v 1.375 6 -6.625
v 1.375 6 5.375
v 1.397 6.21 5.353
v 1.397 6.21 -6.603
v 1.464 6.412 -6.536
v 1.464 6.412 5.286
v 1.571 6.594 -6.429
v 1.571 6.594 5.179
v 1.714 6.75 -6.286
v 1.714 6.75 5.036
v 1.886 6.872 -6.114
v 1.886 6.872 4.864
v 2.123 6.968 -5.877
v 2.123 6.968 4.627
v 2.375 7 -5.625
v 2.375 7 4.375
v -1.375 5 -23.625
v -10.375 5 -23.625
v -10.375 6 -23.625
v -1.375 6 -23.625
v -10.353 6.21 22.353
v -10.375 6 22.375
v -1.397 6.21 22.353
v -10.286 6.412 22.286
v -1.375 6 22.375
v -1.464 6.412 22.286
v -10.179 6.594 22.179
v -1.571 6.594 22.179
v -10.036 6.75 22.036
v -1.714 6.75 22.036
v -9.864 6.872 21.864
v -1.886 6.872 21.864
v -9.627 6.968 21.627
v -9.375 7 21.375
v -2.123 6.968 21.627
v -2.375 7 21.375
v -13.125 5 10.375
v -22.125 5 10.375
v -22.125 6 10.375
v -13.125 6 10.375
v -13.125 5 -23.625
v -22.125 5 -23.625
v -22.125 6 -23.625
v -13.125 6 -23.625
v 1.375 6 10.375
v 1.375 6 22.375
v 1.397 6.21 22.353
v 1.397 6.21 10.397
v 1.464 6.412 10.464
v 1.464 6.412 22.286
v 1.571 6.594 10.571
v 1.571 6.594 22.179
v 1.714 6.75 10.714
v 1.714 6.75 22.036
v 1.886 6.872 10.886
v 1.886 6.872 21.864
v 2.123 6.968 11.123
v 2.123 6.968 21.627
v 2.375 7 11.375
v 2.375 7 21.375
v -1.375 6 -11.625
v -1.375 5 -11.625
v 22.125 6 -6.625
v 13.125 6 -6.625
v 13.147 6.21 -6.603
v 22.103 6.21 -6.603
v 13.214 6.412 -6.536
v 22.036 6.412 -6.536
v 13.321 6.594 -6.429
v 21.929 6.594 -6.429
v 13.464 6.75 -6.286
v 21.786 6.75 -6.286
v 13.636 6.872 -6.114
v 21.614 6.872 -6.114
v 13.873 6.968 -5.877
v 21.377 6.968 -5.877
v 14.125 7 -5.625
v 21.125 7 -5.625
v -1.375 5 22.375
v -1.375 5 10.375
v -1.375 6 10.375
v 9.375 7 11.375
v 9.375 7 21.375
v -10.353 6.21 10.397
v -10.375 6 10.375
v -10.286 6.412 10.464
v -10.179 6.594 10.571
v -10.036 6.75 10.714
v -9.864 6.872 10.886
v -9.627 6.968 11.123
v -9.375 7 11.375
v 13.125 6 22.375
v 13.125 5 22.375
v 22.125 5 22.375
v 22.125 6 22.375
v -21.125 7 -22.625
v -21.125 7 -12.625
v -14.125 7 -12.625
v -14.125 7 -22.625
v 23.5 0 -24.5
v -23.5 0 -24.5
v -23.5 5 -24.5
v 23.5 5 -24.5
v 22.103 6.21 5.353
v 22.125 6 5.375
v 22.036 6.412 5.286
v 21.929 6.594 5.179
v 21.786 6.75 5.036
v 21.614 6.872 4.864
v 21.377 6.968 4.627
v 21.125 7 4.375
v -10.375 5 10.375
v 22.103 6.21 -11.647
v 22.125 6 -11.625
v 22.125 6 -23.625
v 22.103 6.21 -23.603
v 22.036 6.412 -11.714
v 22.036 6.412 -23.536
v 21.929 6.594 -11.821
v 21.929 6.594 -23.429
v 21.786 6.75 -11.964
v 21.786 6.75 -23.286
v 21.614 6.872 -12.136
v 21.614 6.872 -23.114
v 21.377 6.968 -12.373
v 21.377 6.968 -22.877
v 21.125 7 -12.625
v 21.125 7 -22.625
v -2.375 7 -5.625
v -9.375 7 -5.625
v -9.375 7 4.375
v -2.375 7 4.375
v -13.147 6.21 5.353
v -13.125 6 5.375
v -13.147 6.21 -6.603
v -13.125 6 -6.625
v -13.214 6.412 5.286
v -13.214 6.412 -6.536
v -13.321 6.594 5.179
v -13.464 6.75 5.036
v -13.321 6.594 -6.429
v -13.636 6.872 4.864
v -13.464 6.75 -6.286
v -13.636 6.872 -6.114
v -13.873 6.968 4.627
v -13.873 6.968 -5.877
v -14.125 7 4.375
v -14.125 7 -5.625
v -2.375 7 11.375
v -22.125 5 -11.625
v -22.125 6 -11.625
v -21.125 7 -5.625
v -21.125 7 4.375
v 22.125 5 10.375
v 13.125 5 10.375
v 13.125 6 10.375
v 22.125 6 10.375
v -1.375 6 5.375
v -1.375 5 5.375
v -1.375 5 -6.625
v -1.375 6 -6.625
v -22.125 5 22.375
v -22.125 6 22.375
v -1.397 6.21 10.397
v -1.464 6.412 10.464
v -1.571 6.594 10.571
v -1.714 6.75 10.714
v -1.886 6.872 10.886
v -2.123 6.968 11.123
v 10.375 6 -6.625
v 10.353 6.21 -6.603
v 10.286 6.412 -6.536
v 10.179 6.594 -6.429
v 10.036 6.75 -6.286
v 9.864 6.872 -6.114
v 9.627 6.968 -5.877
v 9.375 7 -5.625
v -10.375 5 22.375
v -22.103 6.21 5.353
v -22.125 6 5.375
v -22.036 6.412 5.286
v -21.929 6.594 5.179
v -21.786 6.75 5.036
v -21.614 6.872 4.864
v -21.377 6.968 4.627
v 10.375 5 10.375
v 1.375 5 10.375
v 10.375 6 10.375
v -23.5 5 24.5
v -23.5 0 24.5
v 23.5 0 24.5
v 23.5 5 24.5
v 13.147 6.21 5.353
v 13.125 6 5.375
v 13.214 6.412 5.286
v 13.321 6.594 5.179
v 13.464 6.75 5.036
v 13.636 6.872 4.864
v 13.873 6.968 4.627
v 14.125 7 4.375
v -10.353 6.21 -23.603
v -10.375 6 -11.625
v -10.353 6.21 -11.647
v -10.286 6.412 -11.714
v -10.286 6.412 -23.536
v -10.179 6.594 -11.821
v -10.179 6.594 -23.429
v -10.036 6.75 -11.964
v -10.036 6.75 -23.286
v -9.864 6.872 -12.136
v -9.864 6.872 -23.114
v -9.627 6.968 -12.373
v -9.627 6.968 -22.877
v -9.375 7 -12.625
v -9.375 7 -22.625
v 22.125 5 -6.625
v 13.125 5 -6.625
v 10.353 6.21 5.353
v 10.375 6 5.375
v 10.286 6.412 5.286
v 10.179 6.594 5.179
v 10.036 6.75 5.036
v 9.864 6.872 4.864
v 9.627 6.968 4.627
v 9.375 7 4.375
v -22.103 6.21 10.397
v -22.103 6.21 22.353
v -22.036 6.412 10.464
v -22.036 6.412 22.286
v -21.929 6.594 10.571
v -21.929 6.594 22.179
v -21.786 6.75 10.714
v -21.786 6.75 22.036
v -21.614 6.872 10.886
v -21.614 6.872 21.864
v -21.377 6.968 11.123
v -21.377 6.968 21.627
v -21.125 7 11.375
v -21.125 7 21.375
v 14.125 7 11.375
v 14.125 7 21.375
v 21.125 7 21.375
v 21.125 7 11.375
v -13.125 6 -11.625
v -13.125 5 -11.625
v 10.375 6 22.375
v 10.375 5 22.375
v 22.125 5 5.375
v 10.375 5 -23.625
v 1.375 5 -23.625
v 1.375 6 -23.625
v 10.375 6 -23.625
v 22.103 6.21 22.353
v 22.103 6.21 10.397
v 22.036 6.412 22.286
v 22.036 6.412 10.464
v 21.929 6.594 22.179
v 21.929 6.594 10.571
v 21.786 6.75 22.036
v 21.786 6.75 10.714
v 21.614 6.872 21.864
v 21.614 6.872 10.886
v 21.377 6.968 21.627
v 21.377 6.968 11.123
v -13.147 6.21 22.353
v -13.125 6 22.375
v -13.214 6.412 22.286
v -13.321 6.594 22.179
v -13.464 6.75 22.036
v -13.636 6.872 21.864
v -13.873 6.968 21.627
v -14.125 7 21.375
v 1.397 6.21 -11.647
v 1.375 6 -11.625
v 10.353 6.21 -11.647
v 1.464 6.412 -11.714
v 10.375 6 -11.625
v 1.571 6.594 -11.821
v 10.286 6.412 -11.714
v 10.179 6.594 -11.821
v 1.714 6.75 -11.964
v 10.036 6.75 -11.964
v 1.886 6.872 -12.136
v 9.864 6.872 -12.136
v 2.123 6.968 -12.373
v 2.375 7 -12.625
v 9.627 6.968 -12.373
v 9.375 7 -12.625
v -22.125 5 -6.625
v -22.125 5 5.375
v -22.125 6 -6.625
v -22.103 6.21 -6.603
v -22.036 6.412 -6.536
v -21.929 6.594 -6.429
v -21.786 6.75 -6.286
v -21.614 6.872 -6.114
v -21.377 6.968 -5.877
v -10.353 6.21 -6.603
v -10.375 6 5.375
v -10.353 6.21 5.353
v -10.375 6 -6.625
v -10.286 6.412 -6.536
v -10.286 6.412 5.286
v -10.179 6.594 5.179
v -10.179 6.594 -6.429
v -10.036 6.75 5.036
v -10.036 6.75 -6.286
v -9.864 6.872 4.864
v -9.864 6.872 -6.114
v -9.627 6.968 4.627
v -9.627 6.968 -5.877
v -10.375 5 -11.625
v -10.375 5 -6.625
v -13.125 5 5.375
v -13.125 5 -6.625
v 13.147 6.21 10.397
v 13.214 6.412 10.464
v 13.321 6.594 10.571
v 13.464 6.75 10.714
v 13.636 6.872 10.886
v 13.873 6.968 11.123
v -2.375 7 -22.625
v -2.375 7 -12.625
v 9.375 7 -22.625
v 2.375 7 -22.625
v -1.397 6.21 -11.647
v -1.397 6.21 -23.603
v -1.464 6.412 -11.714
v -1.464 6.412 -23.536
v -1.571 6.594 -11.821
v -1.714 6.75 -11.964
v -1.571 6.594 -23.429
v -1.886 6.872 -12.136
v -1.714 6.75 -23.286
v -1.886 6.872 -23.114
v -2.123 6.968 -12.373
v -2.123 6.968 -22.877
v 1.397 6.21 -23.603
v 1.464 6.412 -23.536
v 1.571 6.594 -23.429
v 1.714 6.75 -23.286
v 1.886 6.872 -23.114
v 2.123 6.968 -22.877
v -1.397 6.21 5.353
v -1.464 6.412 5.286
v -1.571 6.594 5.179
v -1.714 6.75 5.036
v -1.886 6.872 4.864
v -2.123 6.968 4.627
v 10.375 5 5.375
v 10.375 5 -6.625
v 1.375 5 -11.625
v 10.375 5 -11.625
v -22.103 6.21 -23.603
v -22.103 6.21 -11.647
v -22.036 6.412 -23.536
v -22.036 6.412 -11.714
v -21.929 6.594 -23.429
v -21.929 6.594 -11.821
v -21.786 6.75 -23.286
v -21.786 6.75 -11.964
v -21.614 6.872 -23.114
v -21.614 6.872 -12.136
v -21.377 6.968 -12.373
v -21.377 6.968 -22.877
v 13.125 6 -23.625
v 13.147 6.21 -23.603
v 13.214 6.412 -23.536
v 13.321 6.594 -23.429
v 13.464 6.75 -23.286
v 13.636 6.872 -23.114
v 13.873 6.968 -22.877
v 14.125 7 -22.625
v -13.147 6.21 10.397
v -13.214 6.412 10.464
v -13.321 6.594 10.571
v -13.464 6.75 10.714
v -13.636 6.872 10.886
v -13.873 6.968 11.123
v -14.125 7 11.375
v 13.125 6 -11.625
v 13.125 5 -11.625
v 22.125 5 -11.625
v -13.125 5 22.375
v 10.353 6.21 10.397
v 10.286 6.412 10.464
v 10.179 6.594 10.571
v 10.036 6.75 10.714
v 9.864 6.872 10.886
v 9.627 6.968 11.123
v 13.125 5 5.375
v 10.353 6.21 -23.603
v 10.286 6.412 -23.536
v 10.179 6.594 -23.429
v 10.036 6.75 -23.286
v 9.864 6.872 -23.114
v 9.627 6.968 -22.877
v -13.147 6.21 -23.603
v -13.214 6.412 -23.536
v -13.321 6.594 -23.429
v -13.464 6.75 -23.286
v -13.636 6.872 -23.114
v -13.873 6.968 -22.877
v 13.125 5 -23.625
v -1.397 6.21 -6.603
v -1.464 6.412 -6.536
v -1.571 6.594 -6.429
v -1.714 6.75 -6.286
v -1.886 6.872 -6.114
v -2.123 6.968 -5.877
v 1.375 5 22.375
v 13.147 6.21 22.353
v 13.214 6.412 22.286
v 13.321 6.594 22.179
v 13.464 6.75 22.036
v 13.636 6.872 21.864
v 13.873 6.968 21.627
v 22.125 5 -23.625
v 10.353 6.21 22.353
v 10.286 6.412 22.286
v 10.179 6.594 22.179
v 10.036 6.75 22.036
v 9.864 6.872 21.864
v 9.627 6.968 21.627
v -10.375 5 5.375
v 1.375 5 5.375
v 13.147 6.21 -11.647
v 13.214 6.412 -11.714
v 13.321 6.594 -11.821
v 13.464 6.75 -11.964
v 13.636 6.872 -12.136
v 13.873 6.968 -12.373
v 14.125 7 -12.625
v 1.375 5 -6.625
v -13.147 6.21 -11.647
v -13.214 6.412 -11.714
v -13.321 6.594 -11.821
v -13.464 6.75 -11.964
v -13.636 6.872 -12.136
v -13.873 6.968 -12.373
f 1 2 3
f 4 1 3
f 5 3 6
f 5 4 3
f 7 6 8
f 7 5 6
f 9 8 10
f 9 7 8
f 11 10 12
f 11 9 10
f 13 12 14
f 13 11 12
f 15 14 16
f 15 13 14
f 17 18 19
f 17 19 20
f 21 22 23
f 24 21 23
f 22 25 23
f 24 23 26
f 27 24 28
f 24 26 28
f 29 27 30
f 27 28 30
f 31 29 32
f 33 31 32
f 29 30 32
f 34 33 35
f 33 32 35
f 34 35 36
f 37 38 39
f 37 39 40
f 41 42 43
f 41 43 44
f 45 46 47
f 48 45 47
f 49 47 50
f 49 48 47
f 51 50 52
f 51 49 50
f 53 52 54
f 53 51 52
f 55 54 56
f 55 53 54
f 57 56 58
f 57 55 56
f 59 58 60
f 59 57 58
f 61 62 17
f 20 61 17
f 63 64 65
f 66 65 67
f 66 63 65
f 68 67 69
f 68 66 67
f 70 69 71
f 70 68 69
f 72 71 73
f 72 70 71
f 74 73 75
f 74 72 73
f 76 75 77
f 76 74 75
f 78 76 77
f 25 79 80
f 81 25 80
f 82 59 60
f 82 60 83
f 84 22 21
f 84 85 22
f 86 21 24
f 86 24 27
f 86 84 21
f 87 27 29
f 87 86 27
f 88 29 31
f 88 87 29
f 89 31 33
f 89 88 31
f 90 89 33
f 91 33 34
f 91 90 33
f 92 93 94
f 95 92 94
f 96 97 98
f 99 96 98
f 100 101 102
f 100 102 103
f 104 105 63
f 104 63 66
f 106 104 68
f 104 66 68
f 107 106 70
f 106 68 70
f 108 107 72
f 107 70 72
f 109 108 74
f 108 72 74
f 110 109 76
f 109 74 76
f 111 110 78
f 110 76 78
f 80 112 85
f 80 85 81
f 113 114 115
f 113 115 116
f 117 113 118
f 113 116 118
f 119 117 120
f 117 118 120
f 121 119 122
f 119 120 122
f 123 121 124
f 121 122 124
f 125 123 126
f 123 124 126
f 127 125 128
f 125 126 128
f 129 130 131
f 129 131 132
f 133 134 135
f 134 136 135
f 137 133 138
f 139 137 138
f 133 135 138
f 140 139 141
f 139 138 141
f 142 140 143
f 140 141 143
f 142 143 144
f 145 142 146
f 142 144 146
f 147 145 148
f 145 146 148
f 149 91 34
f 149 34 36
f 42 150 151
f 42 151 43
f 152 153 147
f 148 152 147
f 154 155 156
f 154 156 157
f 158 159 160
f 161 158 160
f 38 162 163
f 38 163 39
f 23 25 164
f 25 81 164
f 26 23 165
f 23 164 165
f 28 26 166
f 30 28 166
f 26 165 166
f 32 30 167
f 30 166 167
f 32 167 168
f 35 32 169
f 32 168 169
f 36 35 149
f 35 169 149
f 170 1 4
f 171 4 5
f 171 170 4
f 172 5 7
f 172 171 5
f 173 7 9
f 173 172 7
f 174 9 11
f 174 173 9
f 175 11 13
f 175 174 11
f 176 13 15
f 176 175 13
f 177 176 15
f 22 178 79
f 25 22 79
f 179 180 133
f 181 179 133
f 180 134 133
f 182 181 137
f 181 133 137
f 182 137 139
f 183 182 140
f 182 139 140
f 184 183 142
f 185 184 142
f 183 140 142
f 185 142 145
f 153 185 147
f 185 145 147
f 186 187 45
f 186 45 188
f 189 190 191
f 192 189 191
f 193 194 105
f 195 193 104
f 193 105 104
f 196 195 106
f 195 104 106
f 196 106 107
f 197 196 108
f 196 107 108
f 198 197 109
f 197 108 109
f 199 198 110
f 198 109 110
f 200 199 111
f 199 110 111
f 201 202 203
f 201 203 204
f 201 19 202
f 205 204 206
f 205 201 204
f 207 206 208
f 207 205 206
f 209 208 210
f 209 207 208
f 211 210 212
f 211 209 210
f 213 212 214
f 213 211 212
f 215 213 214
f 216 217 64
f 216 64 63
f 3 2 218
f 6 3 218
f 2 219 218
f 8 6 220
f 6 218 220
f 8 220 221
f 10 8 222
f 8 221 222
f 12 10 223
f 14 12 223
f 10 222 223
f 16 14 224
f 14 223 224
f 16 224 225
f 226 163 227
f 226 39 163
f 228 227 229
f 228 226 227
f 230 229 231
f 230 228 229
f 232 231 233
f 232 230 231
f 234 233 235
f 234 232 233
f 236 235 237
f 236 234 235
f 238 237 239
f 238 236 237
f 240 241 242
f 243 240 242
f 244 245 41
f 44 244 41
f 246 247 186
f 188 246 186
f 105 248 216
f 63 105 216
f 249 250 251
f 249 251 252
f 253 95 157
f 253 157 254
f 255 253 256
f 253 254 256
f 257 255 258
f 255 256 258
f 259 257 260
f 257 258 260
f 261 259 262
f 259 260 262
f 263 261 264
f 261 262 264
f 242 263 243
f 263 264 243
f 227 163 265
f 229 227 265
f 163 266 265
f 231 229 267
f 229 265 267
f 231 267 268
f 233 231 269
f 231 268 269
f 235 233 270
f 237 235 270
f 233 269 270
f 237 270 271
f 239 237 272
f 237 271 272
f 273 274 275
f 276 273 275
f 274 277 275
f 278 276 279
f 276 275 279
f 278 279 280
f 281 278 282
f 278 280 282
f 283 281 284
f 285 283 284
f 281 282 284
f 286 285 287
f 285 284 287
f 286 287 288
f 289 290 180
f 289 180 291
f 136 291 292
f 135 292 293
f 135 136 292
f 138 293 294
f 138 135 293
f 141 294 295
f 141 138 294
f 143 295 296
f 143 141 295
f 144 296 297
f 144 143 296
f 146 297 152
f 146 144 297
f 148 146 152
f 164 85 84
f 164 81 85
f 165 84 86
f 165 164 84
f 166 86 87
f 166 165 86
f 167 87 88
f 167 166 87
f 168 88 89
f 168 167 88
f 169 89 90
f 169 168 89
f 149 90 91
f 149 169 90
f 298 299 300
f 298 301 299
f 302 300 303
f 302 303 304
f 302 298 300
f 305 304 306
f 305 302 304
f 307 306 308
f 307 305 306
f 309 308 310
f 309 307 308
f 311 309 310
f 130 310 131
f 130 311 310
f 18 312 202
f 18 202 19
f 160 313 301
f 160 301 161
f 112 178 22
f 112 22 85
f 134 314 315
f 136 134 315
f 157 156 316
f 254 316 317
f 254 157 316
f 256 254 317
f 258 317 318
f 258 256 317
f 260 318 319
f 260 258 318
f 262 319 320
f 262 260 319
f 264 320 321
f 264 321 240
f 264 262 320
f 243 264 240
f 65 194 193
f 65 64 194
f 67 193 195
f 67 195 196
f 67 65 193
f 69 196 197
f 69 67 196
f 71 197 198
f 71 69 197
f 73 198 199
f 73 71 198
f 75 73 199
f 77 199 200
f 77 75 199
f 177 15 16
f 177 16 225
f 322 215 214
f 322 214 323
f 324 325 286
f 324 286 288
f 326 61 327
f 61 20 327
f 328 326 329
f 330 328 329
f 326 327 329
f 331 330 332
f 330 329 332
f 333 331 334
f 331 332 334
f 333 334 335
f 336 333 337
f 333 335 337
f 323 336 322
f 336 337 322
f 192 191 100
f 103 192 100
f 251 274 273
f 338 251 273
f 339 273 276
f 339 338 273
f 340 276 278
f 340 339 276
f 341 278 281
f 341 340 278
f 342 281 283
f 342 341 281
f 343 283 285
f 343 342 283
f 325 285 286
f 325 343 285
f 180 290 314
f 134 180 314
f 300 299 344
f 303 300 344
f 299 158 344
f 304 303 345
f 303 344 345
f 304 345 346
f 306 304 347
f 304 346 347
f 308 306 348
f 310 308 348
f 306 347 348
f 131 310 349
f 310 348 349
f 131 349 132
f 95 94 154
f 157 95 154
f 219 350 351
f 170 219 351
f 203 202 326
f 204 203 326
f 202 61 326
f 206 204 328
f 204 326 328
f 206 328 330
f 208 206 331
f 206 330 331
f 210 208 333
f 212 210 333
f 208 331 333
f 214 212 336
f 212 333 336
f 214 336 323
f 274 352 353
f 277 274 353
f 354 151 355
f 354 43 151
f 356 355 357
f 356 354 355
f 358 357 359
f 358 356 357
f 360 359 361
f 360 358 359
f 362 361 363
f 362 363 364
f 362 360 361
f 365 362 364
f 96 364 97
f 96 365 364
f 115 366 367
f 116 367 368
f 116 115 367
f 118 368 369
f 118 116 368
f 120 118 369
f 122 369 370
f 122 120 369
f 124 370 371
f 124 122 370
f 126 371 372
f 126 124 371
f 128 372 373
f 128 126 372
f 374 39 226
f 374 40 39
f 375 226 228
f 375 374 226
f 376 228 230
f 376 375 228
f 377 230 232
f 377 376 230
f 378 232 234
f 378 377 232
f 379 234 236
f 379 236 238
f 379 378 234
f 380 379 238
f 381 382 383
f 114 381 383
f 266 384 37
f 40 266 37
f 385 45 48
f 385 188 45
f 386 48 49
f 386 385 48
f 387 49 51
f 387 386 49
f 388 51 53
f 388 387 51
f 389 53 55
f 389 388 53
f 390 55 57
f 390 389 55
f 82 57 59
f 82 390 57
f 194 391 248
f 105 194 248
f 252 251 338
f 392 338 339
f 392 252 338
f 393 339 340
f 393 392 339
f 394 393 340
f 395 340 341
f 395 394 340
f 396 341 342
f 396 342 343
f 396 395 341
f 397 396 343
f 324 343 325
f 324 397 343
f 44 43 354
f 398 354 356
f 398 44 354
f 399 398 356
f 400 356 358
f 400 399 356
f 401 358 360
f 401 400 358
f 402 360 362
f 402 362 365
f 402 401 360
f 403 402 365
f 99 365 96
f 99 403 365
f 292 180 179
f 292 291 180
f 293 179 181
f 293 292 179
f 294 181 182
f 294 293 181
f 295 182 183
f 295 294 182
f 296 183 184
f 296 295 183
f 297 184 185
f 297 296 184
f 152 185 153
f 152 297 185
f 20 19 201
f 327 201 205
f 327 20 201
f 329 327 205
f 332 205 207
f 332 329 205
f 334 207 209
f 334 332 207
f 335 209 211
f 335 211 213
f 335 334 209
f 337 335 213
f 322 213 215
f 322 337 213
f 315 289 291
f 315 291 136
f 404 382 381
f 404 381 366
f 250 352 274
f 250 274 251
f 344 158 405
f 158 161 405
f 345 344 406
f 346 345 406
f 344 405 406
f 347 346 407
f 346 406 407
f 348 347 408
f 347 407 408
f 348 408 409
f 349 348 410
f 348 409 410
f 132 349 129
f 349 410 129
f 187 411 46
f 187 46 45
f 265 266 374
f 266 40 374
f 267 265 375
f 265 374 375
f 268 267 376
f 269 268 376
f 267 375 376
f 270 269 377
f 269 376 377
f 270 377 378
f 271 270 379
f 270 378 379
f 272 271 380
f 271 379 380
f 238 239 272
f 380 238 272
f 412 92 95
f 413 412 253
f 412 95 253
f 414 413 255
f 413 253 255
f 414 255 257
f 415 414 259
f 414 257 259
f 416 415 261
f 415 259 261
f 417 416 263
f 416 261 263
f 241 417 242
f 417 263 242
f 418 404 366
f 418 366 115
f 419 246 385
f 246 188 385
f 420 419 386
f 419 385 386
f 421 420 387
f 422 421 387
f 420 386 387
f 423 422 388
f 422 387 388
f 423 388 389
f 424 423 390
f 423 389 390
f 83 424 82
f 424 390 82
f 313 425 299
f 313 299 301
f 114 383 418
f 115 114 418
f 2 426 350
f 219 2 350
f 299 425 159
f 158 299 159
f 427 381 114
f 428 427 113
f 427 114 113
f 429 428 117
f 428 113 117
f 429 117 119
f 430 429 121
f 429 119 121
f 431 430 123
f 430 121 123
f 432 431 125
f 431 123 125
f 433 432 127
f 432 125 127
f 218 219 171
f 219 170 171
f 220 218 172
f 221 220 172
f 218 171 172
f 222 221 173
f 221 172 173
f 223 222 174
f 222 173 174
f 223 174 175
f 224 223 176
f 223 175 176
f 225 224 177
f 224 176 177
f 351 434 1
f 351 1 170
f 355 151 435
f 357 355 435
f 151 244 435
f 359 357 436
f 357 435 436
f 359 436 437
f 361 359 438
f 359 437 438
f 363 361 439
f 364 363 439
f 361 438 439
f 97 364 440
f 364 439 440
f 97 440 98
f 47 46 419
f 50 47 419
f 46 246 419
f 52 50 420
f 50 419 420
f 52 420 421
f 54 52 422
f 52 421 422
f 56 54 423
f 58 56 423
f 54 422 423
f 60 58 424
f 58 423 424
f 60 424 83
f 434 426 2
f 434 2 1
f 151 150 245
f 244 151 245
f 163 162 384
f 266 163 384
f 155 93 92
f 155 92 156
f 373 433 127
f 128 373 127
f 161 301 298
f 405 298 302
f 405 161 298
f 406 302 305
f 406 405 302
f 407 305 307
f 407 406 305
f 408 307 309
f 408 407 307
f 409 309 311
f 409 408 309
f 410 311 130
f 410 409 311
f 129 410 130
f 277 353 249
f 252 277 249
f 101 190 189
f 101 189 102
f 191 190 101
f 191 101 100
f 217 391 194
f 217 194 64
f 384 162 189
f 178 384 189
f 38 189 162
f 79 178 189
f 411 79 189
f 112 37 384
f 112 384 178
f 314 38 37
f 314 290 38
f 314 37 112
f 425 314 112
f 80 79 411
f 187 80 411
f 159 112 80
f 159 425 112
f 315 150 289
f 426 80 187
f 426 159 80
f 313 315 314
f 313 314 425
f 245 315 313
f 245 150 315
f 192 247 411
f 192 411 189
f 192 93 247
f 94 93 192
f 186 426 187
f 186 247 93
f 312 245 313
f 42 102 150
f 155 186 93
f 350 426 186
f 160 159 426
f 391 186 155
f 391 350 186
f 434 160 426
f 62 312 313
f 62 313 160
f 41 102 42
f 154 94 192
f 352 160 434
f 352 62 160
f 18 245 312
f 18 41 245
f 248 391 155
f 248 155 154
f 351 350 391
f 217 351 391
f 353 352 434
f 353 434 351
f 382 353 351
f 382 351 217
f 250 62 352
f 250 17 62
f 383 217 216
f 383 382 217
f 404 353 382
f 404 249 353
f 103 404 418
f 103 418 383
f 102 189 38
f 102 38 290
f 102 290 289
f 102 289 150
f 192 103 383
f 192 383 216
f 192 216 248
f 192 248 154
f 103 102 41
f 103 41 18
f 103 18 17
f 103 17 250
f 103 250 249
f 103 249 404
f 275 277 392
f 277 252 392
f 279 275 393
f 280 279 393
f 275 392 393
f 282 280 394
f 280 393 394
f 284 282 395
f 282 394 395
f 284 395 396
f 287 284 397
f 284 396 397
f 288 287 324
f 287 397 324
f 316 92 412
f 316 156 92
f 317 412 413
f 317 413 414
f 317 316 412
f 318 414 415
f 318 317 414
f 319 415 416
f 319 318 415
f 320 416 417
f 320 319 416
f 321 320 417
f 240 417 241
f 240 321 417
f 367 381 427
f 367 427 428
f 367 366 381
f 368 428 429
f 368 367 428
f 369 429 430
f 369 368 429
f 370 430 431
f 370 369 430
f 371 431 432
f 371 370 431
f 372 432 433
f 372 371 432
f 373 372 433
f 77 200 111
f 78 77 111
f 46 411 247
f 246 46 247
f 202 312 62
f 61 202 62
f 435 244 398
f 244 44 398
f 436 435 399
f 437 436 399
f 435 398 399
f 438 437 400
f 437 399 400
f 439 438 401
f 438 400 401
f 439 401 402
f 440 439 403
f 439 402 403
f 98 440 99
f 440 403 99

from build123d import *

# Parameters (mm, degrees)
SKETCH1_W              = 47
SKETCH1_H              = 49
BOSS_EXTRUDE1_DEPTH    = 5
SKETCH2_W              = 9
SKETCH2_H              = 12
BOSS_EXTRUDE2_DEPTH    = 2
FILLET1_R              = 1
LPATTERN1_COUNT        = 4
LPATTERN1_PITCH        = 11.75
LPATTERN1_COUNT_DIR2   = 3
LPATTERN1_PITCH_DIR2   = 17
FILLET1_OF_LPATTERN1_R = 1


with BuildPart() as part:
    # Sketch1 → Boss-Extrude1 (new body)
    with BuildSketch(Plane(origin=(0, 0, 0), x_dir=(1, 0, 0), z_dir=(0, 1, 0))):
        Rectangle(SKETCH1_W, SKETCH1_H)
    extrude(amount=BOSS_EXTRUDE1_DEPTH)

    # Sketch2 → Boss-Extrude2 (add)
    with BuildSketch(Plane(origin=(0, 5, 0), x_dir=(1, 0, 0), z_dir=(0, 1, 0))):
        with Locations((-17.625, 17.625)):
            Rectangle(SKETCH2_W, SKETCH2_H)
    boss_extrude2 = extrude(amount=BOSS_EXTRUDE2_DEPTH)

    # Fillet1
    fillet1_edges = [part.edges().sort_by_distance(p)[0] for p in [
        (-13.125, 7, -17.625),
        (-17.625, 7, -23.625),
        (-17.625, 7, -11.625),
        (-22.125, 7, -17.625),
    ]]
    fillet(fillet1_edges, radius=FILLET1_R)

    # LPattern1: Boss-Extrude2 4 × 3
    with Locations(*[(i * LPATTERN1_PITCH, 0, j * LPATTERN1_PITCH_DIR2) for i in range(LPATTERN1_COUNT) for j in range(LPATTERN1_COUNT_DIR2) if (i, j) != (0, 0)]):
        add(boss_extrude2)

    # Fillet1 of LPattern1
    fillet1_of_lpattern1_edges = [part.edges().sort_by_distance(p)[0] for p in [
        (-13.125, 7, -0.625),
        (-17.625, 7, -6.625),
        (-17.625, 7, 5.375),
        (-22.125, 7, -0.625),
        (-13.125, 7, 16.375),
        (-17.625, 7, 10.375),
        (-17.625, 7, 22.375),
        (-22.125, 7, 16.375),
        (-1.375, 7, -17.625),
        (-5.875, 7, -23.625),
        (-5.875, 7, -11.625),
        (-10.375, 7, -17.625),
        (-1.375, 7, -0.625),
        (-5.875, 7, -6.625),
        (-5.875, 7, 5.375),
        (-10.375, 7, -0.625),
        (-1.375, 7, 16.375),
        (-5.875, 7, 10.375),
        (-5.875, 7, 22.375),
        (-10.375, 7, 16.375),
        (10.375, 7, -17.625),
        (5.875, 7, -23.625),
        (5.875, 7, -11.625),
        (1.375, 7, -17.625),
        (10.375, 7, -0.625),
        (5.875, 7, -6.625),
        (5.875, 7, 5.375),
        (1.375, 7, -0.625),
        (10.375, 7, 16.375),
        (5.875, 7, 10.375),
        (5.875, 7, 22.375),
        (1.375, 7, 16.375),
        (22.125, 7, -17.625),
        (17.625, 7, -23.625),
        (17.625, 7, -11.625),
        (13.125, 7, -17.625),
        (22.125, 7, -0.625),
        (17.625, 7, -6.625),
        (17.625, 7, 5.375),
        (13.125, 7, -0.625),
        (22.125, 7, 16.375),
        (17.625, 7, 10.375),
        (17.625, 7, 22.375),
        (13.125, 7, 16.375),
    ]]
    fillet(fillet1_of_lpattern1_edges, radius=FILLET1_OF_LPATTERN1_R)


solid = part.part
